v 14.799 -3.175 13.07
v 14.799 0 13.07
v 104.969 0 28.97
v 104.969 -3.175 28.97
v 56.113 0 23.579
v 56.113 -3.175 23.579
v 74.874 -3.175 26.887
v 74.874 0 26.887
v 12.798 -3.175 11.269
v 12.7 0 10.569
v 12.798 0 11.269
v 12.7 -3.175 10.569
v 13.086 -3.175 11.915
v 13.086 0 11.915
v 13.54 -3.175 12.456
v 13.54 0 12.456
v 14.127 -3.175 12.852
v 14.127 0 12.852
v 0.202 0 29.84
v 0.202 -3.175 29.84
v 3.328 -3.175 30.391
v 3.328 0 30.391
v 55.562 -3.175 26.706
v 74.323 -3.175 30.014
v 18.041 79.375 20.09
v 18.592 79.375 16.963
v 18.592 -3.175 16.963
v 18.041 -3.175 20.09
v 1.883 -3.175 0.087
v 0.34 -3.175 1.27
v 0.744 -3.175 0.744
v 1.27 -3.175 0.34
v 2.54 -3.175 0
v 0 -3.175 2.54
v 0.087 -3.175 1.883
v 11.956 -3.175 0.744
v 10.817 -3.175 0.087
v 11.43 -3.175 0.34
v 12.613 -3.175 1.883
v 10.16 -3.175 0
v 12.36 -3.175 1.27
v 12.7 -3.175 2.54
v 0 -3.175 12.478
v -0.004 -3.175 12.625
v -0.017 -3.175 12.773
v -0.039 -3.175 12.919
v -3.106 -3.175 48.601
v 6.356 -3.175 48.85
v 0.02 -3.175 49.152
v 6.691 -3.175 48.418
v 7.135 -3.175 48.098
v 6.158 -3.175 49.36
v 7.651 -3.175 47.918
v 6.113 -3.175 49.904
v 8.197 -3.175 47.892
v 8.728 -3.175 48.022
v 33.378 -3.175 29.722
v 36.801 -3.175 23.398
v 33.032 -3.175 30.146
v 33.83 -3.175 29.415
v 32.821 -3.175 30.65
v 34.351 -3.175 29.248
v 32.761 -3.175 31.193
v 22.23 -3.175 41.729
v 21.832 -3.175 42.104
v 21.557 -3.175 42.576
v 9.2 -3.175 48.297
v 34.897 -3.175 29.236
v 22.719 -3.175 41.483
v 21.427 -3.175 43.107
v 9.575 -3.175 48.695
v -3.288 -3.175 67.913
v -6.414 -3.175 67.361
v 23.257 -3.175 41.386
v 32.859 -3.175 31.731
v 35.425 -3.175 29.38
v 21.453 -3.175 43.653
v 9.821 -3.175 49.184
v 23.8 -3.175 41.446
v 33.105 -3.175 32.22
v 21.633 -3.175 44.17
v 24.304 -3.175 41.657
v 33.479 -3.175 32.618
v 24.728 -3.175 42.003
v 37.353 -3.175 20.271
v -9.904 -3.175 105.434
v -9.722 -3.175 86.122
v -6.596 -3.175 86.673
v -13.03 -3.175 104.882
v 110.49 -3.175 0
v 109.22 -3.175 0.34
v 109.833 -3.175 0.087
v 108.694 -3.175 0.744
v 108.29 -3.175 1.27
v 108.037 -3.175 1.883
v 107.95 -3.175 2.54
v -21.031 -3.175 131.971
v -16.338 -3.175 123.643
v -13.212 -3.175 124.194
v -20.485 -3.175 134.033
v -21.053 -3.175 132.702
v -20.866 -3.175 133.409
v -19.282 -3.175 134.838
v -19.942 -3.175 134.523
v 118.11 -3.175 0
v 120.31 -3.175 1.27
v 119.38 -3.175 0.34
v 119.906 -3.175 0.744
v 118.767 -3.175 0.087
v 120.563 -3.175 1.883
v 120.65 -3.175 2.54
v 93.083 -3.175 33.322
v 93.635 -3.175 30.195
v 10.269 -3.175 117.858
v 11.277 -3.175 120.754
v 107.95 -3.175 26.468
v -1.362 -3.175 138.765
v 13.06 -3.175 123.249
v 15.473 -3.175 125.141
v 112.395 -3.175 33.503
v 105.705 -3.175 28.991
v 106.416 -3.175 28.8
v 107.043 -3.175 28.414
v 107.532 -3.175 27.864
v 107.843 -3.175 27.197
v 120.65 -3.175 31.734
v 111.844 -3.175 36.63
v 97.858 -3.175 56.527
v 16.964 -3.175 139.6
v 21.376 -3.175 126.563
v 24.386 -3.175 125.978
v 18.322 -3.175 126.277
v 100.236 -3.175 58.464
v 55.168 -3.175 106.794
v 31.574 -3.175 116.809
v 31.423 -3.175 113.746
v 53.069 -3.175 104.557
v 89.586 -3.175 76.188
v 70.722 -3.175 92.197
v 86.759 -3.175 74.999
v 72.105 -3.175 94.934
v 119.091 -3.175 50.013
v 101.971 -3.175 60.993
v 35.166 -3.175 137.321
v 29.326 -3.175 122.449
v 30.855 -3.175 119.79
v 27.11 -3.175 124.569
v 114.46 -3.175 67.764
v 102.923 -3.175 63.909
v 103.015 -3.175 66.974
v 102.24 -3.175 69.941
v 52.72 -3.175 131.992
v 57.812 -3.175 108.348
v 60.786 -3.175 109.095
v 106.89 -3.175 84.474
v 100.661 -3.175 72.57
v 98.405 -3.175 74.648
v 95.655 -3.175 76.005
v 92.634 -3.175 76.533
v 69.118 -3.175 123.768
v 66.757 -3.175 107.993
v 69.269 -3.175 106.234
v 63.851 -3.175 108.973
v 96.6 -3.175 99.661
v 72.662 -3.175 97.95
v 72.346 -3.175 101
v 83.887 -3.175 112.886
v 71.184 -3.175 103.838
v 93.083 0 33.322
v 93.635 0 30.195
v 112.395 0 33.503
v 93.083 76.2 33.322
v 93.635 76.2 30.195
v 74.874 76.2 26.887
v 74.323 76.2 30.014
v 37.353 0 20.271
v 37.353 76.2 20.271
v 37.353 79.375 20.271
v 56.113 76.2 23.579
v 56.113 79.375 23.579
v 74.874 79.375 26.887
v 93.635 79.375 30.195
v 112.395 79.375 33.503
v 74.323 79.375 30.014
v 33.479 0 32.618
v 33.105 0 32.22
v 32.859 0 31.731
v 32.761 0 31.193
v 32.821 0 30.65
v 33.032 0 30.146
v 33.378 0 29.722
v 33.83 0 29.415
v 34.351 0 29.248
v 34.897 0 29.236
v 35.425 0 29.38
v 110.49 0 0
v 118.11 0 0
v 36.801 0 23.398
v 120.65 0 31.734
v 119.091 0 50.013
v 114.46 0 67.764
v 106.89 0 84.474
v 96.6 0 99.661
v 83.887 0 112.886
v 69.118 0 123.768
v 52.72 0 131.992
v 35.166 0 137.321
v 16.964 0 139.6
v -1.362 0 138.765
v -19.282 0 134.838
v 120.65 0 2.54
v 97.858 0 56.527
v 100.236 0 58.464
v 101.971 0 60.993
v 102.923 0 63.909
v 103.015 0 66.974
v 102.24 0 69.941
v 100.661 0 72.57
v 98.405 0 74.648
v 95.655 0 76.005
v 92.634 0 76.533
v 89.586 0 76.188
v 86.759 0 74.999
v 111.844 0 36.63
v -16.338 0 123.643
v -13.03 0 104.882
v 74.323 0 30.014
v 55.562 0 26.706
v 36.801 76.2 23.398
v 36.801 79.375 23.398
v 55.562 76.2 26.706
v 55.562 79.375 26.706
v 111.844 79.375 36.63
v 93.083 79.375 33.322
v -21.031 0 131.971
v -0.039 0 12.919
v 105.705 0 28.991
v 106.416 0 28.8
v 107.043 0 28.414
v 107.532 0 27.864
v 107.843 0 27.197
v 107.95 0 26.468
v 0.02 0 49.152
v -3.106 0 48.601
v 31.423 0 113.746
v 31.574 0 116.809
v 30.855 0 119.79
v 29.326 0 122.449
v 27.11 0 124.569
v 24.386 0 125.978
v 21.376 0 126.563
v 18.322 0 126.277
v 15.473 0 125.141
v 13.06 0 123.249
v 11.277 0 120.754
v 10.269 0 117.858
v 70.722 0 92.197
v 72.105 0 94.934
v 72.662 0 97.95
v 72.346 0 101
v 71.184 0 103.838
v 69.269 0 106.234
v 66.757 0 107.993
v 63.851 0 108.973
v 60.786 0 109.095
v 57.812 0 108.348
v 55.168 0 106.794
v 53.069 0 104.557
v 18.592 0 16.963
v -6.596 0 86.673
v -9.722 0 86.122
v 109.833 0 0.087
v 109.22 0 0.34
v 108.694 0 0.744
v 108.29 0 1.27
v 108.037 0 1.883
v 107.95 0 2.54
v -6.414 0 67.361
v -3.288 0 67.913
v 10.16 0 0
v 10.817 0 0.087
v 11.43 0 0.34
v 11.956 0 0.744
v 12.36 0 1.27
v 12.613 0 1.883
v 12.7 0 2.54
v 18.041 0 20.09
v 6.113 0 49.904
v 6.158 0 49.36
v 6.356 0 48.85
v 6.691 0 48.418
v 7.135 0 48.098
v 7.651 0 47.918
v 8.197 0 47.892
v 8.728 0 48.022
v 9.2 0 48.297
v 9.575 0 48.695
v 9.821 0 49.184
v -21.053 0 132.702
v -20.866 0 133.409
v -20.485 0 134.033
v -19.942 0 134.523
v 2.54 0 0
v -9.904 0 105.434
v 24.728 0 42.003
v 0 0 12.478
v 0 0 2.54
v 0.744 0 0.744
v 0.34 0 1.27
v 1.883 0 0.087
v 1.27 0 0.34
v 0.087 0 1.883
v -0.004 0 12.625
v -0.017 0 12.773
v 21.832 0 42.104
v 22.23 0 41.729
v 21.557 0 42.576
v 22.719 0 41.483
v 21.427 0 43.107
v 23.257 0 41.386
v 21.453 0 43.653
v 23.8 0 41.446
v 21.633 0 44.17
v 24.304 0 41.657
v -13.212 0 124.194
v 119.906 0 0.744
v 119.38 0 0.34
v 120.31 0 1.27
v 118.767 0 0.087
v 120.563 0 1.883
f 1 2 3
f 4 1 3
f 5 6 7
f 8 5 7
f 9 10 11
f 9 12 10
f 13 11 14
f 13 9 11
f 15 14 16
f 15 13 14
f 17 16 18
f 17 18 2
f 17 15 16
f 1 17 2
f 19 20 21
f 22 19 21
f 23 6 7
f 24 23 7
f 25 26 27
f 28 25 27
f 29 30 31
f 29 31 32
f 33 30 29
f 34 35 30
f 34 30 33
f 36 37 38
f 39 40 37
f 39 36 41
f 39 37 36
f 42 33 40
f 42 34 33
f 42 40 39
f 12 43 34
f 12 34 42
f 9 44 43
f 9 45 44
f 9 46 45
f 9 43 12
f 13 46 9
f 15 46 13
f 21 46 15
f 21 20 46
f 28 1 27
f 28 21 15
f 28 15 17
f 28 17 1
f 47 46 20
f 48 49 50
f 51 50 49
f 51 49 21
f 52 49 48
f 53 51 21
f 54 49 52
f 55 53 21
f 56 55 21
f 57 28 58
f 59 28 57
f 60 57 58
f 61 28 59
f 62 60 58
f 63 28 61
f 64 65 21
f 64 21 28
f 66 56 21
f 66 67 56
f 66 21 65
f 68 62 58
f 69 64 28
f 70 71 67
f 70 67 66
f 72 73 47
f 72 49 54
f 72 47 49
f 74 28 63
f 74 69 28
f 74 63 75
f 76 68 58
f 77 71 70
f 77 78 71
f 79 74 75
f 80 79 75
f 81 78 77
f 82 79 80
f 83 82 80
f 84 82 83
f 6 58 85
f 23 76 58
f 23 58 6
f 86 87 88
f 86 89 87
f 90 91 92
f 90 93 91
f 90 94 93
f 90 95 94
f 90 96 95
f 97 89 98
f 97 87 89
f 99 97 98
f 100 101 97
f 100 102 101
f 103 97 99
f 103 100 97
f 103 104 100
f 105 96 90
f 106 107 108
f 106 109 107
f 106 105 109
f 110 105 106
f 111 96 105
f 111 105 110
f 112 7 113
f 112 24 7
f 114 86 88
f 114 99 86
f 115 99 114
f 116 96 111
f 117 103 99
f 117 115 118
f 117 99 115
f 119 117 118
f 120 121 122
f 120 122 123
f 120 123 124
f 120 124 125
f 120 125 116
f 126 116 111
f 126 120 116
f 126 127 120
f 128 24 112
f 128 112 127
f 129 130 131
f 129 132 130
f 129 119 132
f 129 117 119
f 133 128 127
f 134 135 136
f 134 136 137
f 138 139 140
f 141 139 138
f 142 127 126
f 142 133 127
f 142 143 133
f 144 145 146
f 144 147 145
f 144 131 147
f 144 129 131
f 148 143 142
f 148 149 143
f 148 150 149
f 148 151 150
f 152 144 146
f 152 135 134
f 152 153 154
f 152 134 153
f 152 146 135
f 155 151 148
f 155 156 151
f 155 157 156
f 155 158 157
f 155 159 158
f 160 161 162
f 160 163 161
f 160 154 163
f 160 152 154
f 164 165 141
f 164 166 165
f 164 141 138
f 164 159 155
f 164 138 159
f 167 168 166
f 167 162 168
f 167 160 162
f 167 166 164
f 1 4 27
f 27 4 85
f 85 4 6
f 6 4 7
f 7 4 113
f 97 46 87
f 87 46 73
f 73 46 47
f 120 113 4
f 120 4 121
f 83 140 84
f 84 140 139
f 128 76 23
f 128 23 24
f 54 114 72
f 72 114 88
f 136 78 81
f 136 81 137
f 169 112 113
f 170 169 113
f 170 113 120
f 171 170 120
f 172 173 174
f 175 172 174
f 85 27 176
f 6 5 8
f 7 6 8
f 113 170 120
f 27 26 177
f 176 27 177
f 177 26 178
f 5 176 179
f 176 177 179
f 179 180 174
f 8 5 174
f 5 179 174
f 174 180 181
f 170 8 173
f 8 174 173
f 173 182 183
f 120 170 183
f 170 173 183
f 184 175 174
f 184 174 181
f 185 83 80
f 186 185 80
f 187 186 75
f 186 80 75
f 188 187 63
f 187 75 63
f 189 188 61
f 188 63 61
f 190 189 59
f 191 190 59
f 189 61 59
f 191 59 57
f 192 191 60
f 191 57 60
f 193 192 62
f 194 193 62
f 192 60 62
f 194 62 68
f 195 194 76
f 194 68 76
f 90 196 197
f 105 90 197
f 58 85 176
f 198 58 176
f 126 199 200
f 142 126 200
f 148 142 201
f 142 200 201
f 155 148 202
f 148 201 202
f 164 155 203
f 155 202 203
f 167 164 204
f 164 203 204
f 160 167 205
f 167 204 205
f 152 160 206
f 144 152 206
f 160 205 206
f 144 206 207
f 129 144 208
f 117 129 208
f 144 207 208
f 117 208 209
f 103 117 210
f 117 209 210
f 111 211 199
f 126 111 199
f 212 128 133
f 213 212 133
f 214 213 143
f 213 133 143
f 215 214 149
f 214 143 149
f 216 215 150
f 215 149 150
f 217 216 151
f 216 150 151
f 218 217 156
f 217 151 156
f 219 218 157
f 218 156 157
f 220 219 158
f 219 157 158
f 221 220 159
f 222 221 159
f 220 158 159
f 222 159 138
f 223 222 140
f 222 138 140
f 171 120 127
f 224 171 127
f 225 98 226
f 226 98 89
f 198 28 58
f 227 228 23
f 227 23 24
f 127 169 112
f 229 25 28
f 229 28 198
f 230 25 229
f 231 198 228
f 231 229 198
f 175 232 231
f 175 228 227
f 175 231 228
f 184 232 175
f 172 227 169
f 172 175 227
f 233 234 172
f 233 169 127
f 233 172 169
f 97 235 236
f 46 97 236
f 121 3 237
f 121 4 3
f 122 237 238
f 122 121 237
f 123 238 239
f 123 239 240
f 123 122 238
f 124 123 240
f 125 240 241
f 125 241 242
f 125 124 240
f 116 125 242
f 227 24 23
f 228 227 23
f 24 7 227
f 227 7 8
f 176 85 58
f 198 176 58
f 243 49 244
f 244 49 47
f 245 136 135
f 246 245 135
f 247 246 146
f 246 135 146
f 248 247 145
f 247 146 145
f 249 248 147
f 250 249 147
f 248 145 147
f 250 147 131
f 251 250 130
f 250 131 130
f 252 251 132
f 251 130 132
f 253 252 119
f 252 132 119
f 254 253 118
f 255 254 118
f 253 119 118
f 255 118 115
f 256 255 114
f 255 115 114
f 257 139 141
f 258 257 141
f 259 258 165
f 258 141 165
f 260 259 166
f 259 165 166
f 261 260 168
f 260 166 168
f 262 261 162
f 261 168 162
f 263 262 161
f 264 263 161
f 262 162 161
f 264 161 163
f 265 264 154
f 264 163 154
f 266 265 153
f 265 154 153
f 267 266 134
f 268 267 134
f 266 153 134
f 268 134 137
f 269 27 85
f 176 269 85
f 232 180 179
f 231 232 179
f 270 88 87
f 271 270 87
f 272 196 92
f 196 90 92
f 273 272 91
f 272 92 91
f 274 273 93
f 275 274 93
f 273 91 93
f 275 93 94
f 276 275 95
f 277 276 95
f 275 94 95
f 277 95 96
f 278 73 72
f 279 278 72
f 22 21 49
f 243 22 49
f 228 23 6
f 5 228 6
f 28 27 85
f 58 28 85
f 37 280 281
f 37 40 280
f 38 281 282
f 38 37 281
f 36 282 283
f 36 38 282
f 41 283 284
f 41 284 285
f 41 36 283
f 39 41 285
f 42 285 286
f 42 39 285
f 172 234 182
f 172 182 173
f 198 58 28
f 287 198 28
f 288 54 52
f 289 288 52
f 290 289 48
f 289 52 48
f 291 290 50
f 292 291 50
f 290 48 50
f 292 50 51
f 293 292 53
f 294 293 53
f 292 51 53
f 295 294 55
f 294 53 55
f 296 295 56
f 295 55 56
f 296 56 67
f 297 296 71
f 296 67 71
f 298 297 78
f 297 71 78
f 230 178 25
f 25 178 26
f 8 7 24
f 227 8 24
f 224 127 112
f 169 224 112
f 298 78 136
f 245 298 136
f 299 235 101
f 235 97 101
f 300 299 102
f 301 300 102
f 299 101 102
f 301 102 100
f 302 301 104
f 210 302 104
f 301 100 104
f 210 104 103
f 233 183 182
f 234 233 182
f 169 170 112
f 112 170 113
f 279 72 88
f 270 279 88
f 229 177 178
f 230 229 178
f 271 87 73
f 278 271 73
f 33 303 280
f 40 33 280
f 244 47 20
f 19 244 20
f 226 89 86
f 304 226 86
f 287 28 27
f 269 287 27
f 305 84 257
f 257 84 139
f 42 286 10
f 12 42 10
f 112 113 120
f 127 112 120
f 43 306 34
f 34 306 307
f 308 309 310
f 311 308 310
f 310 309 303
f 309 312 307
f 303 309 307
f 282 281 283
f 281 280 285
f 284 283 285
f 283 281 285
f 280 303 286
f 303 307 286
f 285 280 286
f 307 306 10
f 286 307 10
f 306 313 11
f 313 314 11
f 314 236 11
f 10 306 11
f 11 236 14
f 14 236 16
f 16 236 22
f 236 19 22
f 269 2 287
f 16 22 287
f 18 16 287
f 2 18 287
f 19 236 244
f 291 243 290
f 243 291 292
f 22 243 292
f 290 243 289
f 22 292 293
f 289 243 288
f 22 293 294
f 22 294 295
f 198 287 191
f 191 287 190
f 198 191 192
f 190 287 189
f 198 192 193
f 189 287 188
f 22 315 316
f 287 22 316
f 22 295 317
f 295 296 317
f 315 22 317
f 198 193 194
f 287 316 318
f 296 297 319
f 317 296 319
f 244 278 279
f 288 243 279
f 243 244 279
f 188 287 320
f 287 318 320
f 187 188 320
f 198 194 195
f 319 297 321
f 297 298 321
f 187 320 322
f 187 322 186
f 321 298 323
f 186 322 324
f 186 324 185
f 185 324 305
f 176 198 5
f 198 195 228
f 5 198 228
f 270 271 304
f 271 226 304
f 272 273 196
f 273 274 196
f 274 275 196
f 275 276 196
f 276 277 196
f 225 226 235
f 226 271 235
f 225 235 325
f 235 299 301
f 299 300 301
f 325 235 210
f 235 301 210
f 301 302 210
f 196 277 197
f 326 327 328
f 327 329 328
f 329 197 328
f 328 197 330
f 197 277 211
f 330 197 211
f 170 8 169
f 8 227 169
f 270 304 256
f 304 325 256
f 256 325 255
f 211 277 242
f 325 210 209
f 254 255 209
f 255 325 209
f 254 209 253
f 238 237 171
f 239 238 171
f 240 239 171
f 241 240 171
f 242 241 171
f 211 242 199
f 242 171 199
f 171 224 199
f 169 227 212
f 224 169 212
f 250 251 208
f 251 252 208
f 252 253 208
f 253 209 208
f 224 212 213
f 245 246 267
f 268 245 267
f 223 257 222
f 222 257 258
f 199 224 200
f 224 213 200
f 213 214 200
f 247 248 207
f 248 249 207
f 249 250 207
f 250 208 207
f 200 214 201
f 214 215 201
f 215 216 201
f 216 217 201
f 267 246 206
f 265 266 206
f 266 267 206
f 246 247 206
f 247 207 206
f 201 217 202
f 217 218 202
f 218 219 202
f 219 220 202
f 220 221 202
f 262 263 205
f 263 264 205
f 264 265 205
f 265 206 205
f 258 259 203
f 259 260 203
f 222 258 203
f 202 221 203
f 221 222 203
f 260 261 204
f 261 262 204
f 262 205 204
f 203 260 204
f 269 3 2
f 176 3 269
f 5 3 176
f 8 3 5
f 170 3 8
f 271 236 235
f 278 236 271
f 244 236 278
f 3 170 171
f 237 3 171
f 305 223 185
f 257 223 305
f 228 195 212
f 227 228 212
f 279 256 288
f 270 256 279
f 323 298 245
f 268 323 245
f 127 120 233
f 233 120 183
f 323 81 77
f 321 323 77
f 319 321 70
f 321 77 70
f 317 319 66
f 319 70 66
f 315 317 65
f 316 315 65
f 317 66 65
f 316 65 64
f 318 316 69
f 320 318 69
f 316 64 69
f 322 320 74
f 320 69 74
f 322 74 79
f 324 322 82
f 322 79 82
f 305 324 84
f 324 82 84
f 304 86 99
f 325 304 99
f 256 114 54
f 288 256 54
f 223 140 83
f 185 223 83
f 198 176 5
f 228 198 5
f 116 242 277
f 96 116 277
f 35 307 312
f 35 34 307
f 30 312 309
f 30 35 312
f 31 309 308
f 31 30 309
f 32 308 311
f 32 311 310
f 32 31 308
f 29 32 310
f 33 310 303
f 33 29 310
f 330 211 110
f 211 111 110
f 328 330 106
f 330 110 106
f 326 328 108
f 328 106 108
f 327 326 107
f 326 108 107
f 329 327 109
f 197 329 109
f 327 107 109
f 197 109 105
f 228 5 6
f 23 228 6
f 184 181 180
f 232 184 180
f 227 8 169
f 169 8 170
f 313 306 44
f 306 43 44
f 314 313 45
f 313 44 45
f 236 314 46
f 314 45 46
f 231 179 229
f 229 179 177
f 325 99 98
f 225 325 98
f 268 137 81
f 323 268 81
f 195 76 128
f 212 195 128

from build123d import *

# Parameters (mm, degrees)
F1_DEPTH = 3.175
F3_DEPTH = 3.176
F5_DEPTH = 3.175
F6_R     = 2.54


with BuildPart() as f1:
    # F0 (on Front) → F1 (new body)
    with BuildSketch(Plane.XZ):
        with BuildLine():
            Line((0, 12.7), (0, 0))
            Line((0, 0), (12.7, 0))
            Line((12.7, 0), (12.7, 12.7))
            Line((12.7, 12.7), (107.95, 29.495145))
            Line((107.95, 29.495145), (107.95, 0))
            Line((107.95, 0), (120.65, 0))
            Line((120.65, 0), (120.65, 31.734498))
            ThreePointArc((120.65, 31.734498), (75.828675, 119.30146), (-21.41527, 134.15203))
            Line((-21.41527, 134.15203), (0, 12.7))
        make_face()
    extrude(amount=F1_DEPTH)

    # F2 (on face) → F3 (cut, through all)
    with BuildSketch(Plane.XZ.offset(3.175)):
        Polygon((36.801461, 23.397697), (18.040874, 20.089699), (18.592207, 16.962934), (37.352794, 20.270932), align=None)
        Polygon((74.322637, 30.013692), (55.562049, 26.705695), (56.113382, 23.57893), (74.87397, 26.886928), align=None)
        Polygon((111.843812, 36.629688), (93.083224, 33.32169), (93.634557, 30.194926), (112.395145, 33.502923), align=None)
        Polygon((-6.414277, 67.361268), (-3.287512, 67.912601), (-6.59551, 86.673189), (-9.722275, 86.121856), align=None)
        Polygon((0.201719, 29.840093), (3.328483, 30.391426), (0.020486, 49.152013), (-3.106279, 48.60068), align=None)
        Polygon((-13.030272, 104.882444), (-9.903508, 105.433776), (-13.211506, 124.194364), (-16.33827, 123.643031), align=None)
        with BuildLine():
            Line((53.069141, 104.557378), (21.633255, 44.169602))
            ThreePointArc((21.633255, 44.169602), (22.230347, 41.729487), (24.727524, 42.002972))
            Line((24.727524, 42.002972), (70.721765, 92.196878))
            ThreePointArc((70.721765, 92.196878), (68.075703, 107.20344), (53.069141, 104.557378))
        make_face()
        with BuildLine():
            Line((86.759305, 74.998722), (33.479272, 32.617871))
            ThreePointArc((33.479272, 32.617871), (33.032259, 30.145855), (35.424779, 29.380003))
            Line((35.424779, 29.380003), (97.85831, 56.526875))
            ThreePointArc((97.85831, 56.526875), (101.544731, 71.312302), (86.759305, 74.998722))
        make_face()
        with BuildLine():
            Line((10.269057, 117.85753), (6.112867, 49.904425))
            ThreePointArc((6.112867, 49.904425), (7.650823, 47.918128), (9.820871, 49.183662))
            Line((9.820871, 49.183662), (31.423, 113.74562))
            ThreePointArc((31.423, 113.74562), (22.901983, 126.378546), (10.269057, 117.85753))
        make_face()
    extrude(amount=-F3_DEPTH, mode=Mode.SUBTRACT)

    # F6
    f6_edges = [f1.edges().sort_by_distance(p)[0] for p in [
        (0, -1.5875, 0),
        (120.65, -1.5875, 0),
        (107.95, -1.5875, 0),
        (12.7, -1.5875, 0),
        (12.7, -1.5875, 12.7),
        (107.95, -1.5875, 29.495145),
        (0, -1.5875, 12.7),
        (-21.41527, -1.5875, 134.15203),
    ]]
    fillet(f6_edges, radius=F6_R)


with BuildPart() as f5:
    # F4 (on face) → F5 (new body)
    with BuildSketch(Plane(origin=(-2.340209, 0, 13.271985), x_dir=(0.984808, 0, 0.173648), z_dir=(-0.173648, 0, 0.984808))):
        Polygon((97.455332, -3.175), (116.505332, -3.175), (116.505332, 0), (116.505332, 38.1), (116.505332, 76.2), (116.505332, 79.375), (97.455332, 79.375), (97.455332, 76.2), (78.405332, 76.2), (78.405332, 79.375), (59.355332, 79.375), (59.355332, 76.2), (40.305332, 76.2), (40.305332, 79.375), (21.255332, 79.375), (21.255332, 76.2), (21.255332, 38.1), (21.255332, 0), (21.255332, -3.175), (40.305332, -3.175), (40.305332, 0), (59.355332, 0), (59.355332, -3.175), (78.405332, -3.175), (78.405332, 0), (97.455332, 0), align=None)
    extrude(amount=F5_DEPTH)


solid = Compound([f1.part, f5.part])
